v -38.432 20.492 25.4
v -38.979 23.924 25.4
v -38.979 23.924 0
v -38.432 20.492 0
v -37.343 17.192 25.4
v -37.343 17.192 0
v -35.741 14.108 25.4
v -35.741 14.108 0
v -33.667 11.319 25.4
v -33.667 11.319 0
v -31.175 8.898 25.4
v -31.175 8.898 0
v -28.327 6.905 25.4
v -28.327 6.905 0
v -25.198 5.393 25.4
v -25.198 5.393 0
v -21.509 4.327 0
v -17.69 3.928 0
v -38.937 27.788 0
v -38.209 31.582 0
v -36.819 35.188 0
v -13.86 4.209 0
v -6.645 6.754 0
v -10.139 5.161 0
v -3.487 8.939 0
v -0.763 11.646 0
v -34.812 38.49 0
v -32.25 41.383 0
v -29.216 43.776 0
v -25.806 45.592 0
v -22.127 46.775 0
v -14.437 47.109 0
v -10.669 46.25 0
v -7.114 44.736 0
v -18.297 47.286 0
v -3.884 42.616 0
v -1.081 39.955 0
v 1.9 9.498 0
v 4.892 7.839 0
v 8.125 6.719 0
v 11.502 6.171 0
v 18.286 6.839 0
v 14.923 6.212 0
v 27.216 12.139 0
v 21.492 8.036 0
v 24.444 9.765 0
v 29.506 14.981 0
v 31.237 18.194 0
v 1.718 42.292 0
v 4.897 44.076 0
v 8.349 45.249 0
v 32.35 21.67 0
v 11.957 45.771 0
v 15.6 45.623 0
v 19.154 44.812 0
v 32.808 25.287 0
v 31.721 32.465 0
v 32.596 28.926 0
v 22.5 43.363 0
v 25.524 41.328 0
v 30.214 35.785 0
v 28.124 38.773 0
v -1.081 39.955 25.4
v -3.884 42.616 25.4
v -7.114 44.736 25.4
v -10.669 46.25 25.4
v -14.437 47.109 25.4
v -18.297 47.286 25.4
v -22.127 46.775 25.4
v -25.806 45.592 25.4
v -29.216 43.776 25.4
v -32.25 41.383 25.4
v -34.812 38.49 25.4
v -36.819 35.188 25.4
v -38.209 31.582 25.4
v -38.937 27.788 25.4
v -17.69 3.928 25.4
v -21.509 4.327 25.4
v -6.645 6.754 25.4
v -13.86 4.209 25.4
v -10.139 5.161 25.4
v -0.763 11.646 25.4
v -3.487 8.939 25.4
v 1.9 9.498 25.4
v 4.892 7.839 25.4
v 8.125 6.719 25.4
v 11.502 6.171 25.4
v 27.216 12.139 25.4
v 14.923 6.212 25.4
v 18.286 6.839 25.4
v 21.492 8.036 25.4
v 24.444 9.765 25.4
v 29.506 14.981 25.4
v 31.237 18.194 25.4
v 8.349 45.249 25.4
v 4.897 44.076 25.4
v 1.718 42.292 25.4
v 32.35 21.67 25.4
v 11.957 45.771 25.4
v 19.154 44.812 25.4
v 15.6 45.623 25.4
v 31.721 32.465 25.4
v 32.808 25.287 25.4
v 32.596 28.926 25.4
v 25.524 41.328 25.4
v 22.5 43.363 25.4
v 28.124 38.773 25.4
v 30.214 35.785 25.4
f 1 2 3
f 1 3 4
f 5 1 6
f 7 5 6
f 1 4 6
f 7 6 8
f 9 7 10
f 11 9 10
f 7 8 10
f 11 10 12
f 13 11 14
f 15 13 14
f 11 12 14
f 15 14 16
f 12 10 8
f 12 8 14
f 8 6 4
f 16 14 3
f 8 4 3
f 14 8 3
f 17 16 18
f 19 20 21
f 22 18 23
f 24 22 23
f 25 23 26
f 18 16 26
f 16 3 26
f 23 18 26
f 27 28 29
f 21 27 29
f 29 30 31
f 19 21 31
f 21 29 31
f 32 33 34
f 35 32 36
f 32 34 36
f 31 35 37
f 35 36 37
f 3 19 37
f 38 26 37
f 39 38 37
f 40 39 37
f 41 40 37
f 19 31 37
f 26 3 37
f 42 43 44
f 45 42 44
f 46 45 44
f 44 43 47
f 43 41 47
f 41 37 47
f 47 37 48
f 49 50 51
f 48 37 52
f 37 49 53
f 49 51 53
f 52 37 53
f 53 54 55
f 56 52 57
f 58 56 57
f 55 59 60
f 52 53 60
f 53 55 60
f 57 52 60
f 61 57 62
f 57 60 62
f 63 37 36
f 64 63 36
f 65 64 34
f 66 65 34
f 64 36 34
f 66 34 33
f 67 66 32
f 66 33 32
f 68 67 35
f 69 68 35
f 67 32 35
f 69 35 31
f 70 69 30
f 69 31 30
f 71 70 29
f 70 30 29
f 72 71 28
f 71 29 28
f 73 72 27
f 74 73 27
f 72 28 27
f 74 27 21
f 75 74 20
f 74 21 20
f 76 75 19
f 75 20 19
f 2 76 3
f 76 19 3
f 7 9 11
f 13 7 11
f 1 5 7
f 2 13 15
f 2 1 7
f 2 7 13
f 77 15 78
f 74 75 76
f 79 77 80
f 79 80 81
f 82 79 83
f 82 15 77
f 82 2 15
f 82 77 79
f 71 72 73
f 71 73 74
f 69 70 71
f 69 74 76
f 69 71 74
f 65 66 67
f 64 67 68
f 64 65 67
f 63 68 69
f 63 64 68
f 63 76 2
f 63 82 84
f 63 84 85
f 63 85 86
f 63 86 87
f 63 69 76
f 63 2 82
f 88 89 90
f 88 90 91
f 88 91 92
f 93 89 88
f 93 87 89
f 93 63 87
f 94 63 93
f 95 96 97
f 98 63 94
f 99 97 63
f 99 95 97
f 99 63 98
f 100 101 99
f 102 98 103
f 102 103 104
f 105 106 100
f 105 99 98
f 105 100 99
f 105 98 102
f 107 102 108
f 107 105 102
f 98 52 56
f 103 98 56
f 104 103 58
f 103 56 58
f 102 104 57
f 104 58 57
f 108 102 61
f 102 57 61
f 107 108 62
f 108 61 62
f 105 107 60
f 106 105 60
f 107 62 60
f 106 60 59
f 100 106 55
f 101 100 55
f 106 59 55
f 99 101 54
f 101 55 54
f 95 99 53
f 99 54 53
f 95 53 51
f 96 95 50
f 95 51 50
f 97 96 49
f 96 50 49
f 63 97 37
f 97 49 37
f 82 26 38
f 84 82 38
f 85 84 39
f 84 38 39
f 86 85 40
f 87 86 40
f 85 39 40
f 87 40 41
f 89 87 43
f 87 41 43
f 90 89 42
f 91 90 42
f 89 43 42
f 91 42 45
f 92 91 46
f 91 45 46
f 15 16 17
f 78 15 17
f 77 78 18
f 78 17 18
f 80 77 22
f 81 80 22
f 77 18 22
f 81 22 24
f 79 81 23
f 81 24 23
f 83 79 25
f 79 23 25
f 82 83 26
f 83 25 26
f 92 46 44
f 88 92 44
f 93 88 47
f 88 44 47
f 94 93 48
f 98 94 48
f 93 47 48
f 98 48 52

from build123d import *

# Parameters (mm, degrees)
F1_DEPTH = 25.4


with BuildPart() as f1:
    # F0 (on Top) → F1 (new body)
    with BuildSketch(Plane.XY):
        with BuildLine():
            Line((24.443999, 9.764512), (32.35041, 21.669716))
            ThreePointArc((32.35041, 21.669716), (22.499546, 43.363489), (-1.08105, 39.955447))
            ThreePointArc((-1.08105, 39.955447), (-25.805681, 45.592397), (-38.979422, 23.923639))
            Line((-38.979422, 23.923639), (-25.198337, 5.393257))
            ThreePointArc((-25.198337, 5.393257), (-11.978415, 4.602569), (-0.762963, 11.645662))
            ThreePointArc((-0.762963, 11.645662), (11.502175, 6.171376), (24.443999, 9.764512))
        make_face()
        with BuildLine():
            ThreePointArc((24.443999, 9.764512), (29.506368, 14.980504), (32.35041, 21.669716))
            Line((32.35041, 21.669716), (24.443999, 9.764512))
        make_face()
        with BuildLine():
            Line((-25.198337, 5.393257), (-38.979422, 23.923639))
            ThreePointArc((-38.979422, 23.923639), (-34.759944, 12.671971), (-25.198337, 5.393257))
        make_face()
    extrude(amount=F1_DEPTH)


solid = f1.part
